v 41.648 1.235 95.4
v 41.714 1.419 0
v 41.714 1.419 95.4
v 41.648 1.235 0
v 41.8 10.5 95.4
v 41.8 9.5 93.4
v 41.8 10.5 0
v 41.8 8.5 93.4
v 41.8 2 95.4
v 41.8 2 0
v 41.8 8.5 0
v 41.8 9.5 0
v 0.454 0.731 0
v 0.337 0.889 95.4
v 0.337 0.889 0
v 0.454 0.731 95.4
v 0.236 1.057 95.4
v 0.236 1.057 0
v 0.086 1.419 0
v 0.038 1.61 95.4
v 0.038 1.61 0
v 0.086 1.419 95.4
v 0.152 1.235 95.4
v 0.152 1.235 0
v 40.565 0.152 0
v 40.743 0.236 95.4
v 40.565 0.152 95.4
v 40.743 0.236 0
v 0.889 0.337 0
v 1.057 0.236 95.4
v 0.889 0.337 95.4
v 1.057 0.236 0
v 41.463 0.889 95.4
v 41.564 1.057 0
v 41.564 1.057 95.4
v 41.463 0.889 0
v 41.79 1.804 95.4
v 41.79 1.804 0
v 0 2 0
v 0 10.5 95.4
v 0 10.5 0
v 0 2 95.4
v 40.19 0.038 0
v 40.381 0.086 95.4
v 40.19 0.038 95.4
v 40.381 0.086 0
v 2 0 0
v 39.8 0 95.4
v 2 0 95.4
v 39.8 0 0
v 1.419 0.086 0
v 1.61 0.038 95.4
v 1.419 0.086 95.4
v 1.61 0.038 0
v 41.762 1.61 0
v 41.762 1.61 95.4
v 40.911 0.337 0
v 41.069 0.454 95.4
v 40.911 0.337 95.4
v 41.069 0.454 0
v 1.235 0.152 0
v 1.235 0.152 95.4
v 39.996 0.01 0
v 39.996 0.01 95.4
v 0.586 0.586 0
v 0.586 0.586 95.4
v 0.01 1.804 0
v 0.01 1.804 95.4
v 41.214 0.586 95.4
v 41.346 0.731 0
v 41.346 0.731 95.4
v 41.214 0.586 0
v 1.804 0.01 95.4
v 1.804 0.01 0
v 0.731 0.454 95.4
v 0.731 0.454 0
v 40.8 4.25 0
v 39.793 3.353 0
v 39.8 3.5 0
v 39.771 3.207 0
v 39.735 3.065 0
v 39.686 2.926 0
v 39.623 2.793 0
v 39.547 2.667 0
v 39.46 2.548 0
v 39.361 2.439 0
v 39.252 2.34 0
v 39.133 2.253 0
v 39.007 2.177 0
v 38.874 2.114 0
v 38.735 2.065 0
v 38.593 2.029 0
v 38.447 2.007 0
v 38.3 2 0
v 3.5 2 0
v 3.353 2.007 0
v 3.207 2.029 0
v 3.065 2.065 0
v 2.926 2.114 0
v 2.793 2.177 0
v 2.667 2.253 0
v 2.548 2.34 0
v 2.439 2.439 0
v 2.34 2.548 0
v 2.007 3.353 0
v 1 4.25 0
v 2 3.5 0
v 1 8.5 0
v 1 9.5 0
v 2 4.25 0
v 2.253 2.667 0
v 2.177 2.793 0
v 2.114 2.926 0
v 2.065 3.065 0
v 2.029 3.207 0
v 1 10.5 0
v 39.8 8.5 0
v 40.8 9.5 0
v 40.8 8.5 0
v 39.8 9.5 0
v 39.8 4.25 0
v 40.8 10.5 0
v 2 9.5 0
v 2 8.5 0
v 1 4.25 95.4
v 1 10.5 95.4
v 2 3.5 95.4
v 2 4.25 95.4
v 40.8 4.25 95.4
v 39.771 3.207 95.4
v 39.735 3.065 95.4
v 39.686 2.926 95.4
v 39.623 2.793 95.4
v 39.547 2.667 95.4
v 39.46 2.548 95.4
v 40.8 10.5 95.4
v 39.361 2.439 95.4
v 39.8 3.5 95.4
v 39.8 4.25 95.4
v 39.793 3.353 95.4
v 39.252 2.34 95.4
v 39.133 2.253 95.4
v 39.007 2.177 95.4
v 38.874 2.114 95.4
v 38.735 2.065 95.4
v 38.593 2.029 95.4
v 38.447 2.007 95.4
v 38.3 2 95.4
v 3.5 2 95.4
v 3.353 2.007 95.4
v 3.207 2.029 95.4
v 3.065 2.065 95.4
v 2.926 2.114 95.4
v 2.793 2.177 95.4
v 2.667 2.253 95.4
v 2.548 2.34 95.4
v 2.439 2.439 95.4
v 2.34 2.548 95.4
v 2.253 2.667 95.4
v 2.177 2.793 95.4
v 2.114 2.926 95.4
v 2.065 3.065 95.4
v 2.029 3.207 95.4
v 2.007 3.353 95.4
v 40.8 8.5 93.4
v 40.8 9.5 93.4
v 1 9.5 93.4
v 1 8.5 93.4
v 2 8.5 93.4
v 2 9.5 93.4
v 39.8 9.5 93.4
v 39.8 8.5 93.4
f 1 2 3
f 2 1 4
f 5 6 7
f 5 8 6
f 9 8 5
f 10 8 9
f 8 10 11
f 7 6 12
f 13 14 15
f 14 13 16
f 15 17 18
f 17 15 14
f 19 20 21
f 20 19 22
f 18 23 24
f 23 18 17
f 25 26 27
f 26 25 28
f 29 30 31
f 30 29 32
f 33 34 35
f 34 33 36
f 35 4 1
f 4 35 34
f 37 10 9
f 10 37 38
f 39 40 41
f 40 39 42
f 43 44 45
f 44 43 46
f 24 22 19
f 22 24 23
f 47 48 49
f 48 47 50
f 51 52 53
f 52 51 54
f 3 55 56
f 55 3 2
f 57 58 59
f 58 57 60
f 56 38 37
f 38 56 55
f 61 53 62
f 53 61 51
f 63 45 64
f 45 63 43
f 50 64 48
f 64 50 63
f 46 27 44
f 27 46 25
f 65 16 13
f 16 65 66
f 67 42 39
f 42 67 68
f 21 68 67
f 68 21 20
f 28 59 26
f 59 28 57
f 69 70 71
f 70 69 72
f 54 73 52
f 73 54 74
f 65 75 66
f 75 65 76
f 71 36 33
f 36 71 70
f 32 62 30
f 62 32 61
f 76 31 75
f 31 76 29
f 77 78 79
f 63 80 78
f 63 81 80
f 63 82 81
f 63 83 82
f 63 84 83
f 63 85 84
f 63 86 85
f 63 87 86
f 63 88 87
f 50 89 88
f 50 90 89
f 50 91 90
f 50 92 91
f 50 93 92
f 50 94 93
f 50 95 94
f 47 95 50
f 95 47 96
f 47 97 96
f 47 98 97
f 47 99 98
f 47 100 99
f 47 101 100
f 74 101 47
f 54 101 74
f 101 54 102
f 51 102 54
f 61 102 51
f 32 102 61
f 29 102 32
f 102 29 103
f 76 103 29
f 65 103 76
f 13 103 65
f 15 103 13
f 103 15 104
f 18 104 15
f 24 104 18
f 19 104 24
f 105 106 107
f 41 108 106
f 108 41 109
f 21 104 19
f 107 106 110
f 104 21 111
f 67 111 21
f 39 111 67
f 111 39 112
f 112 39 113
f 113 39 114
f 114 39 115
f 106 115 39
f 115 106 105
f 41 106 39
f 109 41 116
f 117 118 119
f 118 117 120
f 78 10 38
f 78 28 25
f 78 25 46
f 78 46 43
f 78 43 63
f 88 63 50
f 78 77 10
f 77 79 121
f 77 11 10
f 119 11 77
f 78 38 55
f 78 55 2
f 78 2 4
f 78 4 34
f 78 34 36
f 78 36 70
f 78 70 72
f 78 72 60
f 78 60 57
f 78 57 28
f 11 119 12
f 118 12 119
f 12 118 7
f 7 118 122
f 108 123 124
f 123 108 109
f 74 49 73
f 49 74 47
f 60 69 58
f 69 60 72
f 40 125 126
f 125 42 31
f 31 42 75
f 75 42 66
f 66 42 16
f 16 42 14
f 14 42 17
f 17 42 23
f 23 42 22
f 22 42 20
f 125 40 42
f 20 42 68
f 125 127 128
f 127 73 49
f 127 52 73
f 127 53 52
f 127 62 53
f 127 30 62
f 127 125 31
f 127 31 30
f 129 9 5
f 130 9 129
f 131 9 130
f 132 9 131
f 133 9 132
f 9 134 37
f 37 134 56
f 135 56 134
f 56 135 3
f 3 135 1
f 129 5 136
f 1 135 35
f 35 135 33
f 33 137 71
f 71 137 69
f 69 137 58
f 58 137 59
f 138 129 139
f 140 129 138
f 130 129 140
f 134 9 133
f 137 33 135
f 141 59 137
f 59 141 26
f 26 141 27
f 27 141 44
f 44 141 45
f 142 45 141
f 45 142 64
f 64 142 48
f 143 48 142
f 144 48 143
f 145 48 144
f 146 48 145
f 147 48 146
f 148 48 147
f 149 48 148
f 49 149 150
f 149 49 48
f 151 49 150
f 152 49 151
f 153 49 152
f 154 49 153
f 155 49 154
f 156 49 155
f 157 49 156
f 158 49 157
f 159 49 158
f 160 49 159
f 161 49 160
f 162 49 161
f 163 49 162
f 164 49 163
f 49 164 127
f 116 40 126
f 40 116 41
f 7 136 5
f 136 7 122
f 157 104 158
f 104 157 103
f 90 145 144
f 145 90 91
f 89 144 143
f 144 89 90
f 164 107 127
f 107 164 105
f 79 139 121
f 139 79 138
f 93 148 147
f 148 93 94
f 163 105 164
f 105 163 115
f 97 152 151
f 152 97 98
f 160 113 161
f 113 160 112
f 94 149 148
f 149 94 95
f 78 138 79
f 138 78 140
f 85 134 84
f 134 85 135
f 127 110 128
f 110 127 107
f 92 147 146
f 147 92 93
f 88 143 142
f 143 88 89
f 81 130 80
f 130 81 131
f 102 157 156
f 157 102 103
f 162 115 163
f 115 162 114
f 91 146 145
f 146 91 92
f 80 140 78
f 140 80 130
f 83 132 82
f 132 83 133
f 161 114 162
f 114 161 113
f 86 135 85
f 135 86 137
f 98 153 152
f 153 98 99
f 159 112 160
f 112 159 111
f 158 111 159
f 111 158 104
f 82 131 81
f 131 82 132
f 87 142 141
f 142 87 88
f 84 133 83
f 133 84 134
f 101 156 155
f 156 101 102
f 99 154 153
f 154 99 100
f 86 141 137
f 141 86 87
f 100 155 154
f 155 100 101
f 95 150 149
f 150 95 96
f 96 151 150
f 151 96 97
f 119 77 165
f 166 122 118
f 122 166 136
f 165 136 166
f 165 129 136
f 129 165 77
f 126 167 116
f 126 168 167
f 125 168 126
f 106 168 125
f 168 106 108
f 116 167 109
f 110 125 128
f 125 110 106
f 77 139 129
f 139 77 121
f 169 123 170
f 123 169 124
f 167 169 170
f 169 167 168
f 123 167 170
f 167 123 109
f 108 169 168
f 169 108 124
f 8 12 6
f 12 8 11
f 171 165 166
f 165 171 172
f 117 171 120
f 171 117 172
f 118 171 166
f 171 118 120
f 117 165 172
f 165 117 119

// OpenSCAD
$fn=64;

bit_length=28+1;
bit_width=4.5;
bit_shaft=20;
gap=1;
colums=7;
rows=3;
wall=2;
spacing=0.2;

inlay_width=colums*(bit_width+gap/2);
inlay_length=rows*(bit_length+gap)+gap;
inlay_height=bit_width;

case_bottom_dim=[inlay_width,inlay_height,inlay_length]
               +[2*(wall+spacing),wall+spacing,2*(wall+spacing)];
               
case_dim=case_bottom_dim+[wall+2*spacing,bit_width/2+2*wall+spacing,0];

//bit_inlay();
//case_bottom();
case_slider();

module case_slider()
{
    difference()
    {
        case_extern_top();
        translate([wall,wall,0])
        {
            cube_round(case_bottom_dim+[2*spacing-wall,bit_width/2+spacing,0],mki=3);
        }
        translate([wall/2,bit_width/2+wall,0])
        {
            cube(case_bottom_dim+[2*spacing,0,0]);
        }
        
    }
    slide_bars();
}

module case_bottom()
{
    translate([wall/2+spacing,bit_width/2+spacing+wall,0])
    {
        difference()
        {
            cube(case_bottom_dim);
            translate(-[wall/2+spacing,bit_width/2+spacing+wall,0])
            {
                #slide_bars(height=1+spacing,width=2+spacing,spacing=spacing);
            }
            translate([wall,0,wall])
            {
                cube([inlay_width+2*spacing,inlay_height+spacing,inlay_length+2*spacing]);
            }
        }
    }
    case_extern_bottom();
}

module bit_inlay()
{
    translate([wall+2*spacing+wall/2,bit_width/2+spacing+wall,wall+spacing])
    {
        difference()
        {
            cube([inlay_width,
                  inlay_height,
                  inlay_length]);
            bit_cutout();
        }
    }
}

module case_extern_top()
{
    intersection()
    {
        cube_round(case_dim,mki=4);
        cube([case_bottom_dim[0]+wall+2*spacing,
              bit_width+3*wall,
              case_bottom_dim[2]]);
    }
}

module case_extern_bottom()
{
    intersection()
    {
        difference()
        {
            cube_round(case_dim,mki=4);
            translate([wall,wall,0])
            {
                cube_round(case_bottom_dim+[2*spacing-wall,bit_width/2+spacing,0],mki=3);
            }
        }
        translate([0,bit_width+3*wall+spacing,0])
        {
            cube([case_bottom_dim[0]+wall+2*spacing,
                  inlay_height,
                  case_bottom_dim[2]]);
        }
    }
}

module slide_bars(height=1,width=2,spacing=0)
{
    translate([0,bit_width+2*wall,0])
    {
        cube([width,height,case_dim[2]-2+spacing]);
    }

    translate([case_dim[0]-width,bit_width+2*wall,0])
    {
        cube([width,height,case_dim[2]-2+spacing]);
    }
}

module bit_row()
{
    for (i = [0:colums-1])
    {
        translate([i*(bit_width+gap/2)+bit_width/2,0,0])
        {
            cylinder(d=bit_width, h=bit_shaft, $fn=6);
            translate([0,1,bit_shaft+(bit_length-bit_shaft)/2])
            {
                cube([bit_width+gap,bit_width+1,bit_length-bit_shaft], center=true);
            }
        }
    }
}

module bit_cutout()
{
    translate([0.25,0,gap])
    {
        for (i = [0:rows-1])
        {
            translate([0,0,i*(bit_length+gap)])
            {
                bit_row();
                translate([gap,bit_width/2+gap/2,0])
                {
                    cube([inlay_width-bit_width/2,3,bit_shaft-gap]);
                }
            }
        }
    }
}

module cube_round(dim,mki=5,plane="xy"){
    if(mki<=0)
    {
        cube(dim);
    }
    else
    {
        if(plane=="xy")
        {
            translate([mki/2,mki/2,0])
            {
                linear_extrude(dim[2])
                {
                    minkowski()
                    {
                        square([dim[0]-mki,dim[1]-mki]);
                        circle(d=mki);
                    }
                }
            }
        }
        if(plane=="yz")
        {
            translate([0,mki/2,dim[2]-mki/2])
            {
                rotate([0,90,0])
                {
                    linear_extrude(dim[0])
                    {
                        minkowski()
                        {
                            square([dim[2]-mki,dim[1]-mki]);
                            circle(d=mki);
                        }
                    }
                }
            }
        }
        if(plane=="xz")
        {
            translate([mki/2,dim[1],mki/2])
            {
                rotate([90,0,0])
                {
                    linear_extrude(dim[1])
                    {
                        minkowski()
                        {
                            square([dim[0]-mki,dim[2]-mki]);
                            circle(d=mki);
                        }
                    }
                }
            }
        }
    }
}
